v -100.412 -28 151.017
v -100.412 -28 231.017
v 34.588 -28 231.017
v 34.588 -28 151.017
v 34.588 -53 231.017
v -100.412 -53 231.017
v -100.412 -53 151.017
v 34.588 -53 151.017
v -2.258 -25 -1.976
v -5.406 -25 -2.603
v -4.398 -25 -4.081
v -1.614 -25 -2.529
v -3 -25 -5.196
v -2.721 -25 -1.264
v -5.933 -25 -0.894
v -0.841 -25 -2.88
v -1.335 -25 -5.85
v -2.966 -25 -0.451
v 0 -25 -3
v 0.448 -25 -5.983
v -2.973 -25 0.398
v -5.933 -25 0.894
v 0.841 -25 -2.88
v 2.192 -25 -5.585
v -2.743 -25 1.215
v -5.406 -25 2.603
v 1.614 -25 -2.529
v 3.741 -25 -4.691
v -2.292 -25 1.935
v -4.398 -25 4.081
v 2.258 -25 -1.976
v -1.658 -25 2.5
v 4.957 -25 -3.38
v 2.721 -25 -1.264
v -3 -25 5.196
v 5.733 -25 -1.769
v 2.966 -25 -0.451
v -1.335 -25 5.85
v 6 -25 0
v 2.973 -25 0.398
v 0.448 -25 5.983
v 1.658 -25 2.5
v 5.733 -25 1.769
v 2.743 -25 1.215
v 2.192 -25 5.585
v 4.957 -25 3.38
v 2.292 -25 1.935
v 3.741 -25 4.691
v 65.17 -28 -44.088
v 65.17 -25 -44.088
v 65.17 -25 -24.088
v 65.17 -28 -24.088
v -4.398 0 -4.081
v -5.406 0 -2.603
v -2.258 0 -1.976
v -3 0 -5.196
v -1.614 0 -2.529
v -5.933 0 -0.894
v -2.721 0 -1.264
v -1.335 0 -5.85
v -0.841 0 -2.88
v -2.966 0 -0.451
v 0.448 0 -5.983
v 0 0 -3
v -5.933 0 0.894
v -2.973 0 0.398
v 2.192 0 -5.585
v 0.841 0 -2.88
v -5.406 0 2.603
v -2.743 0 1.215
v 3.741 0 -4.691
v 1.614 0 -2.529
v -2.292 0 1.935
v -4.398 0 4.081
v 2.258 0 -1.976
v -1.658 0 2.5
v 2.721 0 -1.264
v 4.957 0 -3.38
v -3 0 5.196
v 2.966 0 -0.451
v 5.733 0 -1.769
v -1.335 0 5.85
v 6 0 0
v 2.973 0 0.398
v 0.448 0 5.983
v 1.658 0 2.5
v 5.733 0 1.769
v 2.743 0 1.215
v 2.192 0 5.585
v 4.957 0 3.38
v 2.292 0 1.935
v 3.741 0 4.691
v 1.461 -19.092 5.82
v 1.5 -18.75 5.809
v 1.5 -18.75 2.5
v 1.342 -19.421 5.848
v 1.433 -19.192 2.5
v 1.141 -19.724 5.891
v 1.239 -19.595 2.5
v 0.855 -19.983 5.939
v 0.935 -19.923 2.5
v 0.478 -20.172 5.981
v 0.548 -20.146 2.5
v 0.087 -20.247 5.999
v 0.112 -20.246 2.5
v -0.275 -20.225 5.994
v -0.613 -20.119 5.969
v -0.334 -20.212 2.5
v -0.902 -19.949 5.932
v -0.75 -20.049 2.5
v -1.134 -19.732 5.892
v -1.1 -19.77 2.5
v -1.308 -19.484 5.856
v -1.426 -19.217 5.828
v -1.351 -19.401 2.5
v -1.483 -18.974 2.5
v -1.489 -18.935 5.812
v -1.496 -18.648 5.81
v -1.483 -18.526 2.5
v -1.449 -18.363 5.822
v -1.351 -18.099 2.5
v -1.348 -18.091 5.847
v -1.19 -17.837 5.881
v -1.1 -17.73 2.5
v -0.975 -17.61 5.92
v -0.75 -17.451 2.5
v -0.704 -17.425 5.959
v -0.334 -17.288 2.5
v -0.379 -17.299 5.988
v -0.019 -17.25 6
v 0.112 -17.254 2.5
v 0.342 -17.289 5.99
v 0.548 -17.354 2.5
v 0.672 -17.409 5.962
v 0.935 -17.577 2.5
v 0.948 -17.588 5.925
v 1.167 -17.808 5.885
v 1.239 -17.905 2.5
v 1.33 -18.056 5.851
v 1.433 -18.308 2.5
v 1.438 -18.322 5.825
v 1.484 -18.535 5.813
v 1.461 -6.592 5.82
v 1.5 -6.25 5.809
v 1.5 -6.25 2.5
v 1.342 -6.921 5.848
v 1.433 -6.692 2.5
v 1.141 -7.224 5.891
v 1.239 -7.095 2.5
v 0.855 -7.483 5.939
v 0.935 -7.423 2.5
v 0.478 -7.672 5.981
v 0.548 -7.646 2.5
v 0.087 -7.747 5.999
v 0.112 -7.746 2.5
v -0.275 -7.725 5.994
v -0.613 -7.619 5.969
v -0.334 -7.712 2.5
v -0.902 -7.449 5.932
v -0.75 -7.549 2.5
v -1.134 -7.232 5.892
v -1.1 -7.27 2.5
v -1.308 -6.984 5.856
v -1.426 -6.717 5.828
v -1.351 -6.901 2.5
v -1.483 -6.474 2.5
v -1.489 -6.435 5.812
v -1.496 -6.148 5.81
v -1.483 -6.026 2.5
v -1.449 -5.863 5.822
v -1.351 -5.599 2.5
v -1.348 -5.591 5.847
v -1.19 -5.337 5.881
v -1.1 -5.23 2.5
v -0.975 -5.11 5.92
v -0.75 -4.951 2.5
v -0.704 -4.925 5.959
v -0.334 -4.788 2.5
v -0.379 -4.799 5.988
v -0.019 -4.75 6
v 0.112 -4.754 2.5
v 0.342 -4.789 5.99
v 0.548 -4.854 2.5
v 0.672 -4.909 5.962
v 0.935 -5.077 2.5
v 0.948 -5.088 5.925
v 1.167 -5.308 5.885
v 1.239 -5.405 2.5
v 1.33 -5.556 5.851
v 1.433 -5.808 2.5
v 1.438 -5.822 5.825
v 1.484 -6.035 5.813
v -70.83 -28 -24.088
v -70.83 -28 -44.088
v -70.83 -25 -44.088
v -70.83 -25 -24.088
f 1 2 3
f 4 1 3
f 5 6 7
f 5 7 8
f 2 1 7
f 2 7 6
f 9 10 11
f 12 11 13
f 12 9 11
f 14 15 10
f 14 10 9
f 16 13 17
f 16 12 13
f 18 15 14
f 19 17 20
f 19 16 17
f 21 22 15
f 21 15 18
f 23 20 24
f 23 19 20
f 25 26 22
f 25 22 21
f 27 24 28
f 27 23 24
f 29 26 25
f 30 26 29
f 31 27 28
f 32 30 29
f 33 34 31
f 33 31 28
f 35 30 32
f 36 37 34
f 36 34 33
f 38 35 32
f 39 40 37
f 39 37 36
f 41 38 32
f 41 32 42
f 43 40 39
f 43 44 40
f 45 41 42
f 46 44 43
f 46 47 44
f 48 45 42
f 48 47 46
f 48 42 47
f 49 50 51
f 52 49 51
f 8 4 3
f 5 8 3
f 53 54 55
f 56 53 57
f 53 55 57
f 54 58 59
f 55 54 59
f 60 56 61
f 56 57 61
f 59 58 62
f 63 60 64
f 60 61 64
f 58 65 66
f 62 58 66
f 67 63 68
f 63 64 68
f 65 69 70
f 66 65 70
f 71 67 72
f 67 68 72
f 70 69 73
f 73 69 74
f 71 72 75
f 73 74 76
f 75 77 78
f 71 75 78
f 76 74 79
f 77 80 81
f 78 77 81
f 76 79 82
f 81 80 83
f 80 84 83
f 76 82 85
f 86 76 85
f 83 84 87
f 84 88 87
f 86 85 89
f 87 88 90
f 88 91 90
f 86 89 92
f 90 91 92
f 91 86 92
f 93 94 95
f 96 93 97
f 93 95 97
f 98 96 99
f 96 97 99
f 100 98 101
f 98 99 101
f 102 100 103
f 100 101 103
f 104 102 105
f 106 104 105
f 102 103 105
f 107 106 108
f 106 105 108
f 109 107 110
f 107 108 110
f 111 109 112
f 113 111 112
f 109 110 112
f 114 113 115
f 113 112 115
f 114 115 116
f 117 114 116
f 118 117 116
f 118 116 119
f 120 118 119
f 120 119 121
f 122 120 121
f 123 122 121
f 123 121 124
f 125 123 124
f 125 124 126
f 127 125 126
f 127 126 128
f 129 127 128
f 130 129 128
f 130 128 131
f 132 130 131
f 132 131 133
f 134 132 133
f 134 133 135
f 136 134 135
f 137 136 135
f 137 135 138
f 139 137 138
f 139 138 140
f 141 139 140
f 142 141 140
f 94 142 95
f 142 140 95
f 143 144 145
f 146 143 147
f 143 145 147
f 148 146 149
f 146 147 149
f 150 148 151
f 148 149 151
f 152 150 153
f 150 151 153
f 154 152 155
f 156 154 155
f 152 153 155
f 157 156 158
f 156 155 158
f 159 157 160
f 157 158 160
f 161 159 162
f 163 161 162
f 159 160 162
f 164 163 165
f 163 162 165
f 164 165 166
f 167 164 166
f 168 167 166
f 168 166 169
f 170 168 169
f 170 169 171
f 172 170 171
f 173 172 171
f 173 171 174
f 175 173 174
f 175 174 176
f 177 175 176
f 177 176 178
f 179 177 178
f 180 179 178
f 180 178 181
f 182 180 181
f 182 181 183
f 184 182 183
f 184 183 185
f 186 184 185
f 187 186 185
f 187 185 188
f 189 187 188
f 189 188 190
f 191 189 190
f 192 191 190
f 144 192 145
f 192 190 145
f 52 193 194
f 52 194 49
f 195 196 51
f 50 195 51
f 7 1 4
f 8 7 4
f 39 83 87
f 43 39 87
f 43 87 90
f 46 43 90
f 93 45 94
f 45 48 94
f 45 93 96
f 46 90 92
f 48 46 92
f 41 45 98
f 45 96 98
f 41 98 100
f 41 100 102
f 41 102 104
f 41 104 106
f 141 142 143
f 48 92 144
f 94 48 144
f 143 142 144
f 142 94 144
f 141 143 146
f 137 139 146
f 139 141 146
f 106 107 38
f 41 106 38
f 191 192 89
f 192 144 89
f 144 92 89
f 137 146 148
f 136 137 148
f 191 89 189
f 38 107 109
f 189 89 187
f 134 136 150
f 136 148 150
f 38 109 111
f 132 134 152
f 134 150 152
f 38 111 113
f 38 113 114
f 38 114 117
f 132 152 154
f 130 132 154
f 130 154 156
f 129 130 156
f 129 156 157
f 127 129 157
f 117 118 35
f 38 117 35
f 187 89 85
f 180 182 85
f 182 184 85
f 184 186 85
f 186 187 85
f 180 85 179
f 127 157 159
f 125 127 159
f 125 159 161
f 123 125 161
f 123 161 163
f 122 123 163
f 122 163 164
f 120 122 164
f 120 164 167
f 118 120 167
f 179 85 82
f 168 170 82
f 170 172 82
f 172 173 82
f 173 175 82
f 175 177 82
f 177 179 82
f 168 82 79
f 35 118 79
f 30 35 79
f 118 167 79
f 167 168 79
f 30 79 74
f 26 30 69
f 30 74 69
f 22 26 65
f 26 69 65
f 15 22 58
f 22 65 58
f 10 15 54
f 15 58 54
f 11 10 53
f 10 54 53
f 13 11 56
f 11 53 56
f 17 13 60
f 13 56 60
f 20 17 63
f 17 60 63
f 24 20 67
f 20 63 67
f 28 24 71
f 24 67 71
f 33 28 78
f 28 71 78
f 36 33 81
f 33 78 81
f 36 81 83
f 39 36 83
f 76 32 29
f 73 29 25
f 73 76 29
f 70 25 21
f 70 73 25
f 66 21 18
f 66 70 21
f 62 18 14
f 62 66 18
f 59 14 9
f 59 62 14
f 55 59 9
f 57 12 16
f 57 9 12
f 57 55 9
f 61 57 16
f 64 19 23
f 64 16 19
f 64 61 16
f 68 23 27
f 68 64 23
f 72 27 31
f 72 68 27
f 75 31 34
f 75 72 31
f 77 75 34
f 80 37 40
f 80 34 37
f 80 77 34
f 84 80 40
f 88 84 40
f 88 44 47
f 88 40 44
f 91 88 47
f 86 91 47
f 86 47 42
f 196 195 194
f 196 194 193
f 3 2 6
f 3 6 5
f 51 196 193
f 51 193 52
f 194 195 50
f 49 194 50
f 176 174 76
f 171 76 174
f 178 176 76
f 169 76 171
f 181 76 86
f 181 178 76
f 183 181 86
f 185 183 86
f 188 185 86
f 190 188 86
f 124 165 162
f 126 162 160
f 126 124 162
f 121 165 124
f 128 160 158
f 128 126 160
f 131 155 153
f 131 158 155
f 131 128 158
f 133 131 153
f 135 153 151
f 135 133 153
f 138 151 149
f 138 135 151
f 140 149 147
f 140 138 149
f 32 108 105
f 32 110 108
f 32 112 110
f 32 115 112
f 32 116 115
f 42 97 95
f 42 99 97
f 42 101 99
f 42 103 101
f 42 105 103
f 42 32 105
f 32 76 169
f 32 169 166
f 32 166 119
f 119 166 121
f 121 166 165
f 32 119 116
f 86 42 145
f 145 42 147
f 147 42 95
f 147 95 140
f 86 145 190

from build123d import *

# Parameters (mm, degrees)
F0_R      = 6
F1_DEPTH  = 25
F2_R      = 3
F3_DEPTH  = 25
F5_DEPTH  = 25
F6_R      = 1.5
F7_DEPTH  = 3.5
F8_W      = 136
F8_H      = 20
F9_DEPTH  = 3
F11_W     = 135
F11_H     = 80
F12_DEPTH = 25


with BuildPart() as f1:
    # F0 (on Front) → F1 (new body)
    with BuildSketch(Plane.XZ):
        Circle(F0_R)
    extrude(amount=F1_DEPTH)

    # F2 (on Front) → F3 (cut, through all)
    with BuildSketch(Plane.XZ):
        Circle(F2_R)
    extrude(amount=F3_DEPTH, mode=Mode.SUBTRACT)

    # F4 (on face) → F5 (join, through all)
    with BuildSketch(Plane.XZ.offset(25)):
        with BuildLine():
            Line((-1.6583123952, 2.5), (0, 2.5))
            Line((0, 2.5), (1.6583123952, 2.5))
            ThreePointArc((1.6583123952, 2.5), (0, 3), (-1.6583123952, 2.5))
        make_face()
    extrude(amount=-F5_DEPTH)

    # F6 (on face) → F7 (cut, through all)
    with BuildSketch(Plane(origin=(0, 0, 2.5), x_dir=(1, 0, 0), z_dir=(0, 0, -1))):
        with Locations((0, 18.75)):
            Circle(F6_R)
        with Locations((0, 6.25)):
            Circle(F6_R)
    extrude(amount=-F7_DEPTH, mode=Mode.SUBTRACT)


with BuildPart() as f9:
    # F8 (on face) → F9 (new body)
    with BuildSketch(Plane.XZ.offset(25)):
        with Locations((-2.8303451836, -34.0883203877)):
            Rectangle(F8_W, F8_H)
    extrude(amount=F9_DEPTH)


with BuildPart() as f12:
    # F11 (on face) → F12 (new body)
    with BuildSketch(Plane.XZ.offset(28)):
        with Locations((-32.9120505211, 191.017486155)):
            Rectangle(F11_W, F11_H)
    extrude(amount=F12_DEPTH)


solid = Compound([f1.part, f9.part, f12.part])
